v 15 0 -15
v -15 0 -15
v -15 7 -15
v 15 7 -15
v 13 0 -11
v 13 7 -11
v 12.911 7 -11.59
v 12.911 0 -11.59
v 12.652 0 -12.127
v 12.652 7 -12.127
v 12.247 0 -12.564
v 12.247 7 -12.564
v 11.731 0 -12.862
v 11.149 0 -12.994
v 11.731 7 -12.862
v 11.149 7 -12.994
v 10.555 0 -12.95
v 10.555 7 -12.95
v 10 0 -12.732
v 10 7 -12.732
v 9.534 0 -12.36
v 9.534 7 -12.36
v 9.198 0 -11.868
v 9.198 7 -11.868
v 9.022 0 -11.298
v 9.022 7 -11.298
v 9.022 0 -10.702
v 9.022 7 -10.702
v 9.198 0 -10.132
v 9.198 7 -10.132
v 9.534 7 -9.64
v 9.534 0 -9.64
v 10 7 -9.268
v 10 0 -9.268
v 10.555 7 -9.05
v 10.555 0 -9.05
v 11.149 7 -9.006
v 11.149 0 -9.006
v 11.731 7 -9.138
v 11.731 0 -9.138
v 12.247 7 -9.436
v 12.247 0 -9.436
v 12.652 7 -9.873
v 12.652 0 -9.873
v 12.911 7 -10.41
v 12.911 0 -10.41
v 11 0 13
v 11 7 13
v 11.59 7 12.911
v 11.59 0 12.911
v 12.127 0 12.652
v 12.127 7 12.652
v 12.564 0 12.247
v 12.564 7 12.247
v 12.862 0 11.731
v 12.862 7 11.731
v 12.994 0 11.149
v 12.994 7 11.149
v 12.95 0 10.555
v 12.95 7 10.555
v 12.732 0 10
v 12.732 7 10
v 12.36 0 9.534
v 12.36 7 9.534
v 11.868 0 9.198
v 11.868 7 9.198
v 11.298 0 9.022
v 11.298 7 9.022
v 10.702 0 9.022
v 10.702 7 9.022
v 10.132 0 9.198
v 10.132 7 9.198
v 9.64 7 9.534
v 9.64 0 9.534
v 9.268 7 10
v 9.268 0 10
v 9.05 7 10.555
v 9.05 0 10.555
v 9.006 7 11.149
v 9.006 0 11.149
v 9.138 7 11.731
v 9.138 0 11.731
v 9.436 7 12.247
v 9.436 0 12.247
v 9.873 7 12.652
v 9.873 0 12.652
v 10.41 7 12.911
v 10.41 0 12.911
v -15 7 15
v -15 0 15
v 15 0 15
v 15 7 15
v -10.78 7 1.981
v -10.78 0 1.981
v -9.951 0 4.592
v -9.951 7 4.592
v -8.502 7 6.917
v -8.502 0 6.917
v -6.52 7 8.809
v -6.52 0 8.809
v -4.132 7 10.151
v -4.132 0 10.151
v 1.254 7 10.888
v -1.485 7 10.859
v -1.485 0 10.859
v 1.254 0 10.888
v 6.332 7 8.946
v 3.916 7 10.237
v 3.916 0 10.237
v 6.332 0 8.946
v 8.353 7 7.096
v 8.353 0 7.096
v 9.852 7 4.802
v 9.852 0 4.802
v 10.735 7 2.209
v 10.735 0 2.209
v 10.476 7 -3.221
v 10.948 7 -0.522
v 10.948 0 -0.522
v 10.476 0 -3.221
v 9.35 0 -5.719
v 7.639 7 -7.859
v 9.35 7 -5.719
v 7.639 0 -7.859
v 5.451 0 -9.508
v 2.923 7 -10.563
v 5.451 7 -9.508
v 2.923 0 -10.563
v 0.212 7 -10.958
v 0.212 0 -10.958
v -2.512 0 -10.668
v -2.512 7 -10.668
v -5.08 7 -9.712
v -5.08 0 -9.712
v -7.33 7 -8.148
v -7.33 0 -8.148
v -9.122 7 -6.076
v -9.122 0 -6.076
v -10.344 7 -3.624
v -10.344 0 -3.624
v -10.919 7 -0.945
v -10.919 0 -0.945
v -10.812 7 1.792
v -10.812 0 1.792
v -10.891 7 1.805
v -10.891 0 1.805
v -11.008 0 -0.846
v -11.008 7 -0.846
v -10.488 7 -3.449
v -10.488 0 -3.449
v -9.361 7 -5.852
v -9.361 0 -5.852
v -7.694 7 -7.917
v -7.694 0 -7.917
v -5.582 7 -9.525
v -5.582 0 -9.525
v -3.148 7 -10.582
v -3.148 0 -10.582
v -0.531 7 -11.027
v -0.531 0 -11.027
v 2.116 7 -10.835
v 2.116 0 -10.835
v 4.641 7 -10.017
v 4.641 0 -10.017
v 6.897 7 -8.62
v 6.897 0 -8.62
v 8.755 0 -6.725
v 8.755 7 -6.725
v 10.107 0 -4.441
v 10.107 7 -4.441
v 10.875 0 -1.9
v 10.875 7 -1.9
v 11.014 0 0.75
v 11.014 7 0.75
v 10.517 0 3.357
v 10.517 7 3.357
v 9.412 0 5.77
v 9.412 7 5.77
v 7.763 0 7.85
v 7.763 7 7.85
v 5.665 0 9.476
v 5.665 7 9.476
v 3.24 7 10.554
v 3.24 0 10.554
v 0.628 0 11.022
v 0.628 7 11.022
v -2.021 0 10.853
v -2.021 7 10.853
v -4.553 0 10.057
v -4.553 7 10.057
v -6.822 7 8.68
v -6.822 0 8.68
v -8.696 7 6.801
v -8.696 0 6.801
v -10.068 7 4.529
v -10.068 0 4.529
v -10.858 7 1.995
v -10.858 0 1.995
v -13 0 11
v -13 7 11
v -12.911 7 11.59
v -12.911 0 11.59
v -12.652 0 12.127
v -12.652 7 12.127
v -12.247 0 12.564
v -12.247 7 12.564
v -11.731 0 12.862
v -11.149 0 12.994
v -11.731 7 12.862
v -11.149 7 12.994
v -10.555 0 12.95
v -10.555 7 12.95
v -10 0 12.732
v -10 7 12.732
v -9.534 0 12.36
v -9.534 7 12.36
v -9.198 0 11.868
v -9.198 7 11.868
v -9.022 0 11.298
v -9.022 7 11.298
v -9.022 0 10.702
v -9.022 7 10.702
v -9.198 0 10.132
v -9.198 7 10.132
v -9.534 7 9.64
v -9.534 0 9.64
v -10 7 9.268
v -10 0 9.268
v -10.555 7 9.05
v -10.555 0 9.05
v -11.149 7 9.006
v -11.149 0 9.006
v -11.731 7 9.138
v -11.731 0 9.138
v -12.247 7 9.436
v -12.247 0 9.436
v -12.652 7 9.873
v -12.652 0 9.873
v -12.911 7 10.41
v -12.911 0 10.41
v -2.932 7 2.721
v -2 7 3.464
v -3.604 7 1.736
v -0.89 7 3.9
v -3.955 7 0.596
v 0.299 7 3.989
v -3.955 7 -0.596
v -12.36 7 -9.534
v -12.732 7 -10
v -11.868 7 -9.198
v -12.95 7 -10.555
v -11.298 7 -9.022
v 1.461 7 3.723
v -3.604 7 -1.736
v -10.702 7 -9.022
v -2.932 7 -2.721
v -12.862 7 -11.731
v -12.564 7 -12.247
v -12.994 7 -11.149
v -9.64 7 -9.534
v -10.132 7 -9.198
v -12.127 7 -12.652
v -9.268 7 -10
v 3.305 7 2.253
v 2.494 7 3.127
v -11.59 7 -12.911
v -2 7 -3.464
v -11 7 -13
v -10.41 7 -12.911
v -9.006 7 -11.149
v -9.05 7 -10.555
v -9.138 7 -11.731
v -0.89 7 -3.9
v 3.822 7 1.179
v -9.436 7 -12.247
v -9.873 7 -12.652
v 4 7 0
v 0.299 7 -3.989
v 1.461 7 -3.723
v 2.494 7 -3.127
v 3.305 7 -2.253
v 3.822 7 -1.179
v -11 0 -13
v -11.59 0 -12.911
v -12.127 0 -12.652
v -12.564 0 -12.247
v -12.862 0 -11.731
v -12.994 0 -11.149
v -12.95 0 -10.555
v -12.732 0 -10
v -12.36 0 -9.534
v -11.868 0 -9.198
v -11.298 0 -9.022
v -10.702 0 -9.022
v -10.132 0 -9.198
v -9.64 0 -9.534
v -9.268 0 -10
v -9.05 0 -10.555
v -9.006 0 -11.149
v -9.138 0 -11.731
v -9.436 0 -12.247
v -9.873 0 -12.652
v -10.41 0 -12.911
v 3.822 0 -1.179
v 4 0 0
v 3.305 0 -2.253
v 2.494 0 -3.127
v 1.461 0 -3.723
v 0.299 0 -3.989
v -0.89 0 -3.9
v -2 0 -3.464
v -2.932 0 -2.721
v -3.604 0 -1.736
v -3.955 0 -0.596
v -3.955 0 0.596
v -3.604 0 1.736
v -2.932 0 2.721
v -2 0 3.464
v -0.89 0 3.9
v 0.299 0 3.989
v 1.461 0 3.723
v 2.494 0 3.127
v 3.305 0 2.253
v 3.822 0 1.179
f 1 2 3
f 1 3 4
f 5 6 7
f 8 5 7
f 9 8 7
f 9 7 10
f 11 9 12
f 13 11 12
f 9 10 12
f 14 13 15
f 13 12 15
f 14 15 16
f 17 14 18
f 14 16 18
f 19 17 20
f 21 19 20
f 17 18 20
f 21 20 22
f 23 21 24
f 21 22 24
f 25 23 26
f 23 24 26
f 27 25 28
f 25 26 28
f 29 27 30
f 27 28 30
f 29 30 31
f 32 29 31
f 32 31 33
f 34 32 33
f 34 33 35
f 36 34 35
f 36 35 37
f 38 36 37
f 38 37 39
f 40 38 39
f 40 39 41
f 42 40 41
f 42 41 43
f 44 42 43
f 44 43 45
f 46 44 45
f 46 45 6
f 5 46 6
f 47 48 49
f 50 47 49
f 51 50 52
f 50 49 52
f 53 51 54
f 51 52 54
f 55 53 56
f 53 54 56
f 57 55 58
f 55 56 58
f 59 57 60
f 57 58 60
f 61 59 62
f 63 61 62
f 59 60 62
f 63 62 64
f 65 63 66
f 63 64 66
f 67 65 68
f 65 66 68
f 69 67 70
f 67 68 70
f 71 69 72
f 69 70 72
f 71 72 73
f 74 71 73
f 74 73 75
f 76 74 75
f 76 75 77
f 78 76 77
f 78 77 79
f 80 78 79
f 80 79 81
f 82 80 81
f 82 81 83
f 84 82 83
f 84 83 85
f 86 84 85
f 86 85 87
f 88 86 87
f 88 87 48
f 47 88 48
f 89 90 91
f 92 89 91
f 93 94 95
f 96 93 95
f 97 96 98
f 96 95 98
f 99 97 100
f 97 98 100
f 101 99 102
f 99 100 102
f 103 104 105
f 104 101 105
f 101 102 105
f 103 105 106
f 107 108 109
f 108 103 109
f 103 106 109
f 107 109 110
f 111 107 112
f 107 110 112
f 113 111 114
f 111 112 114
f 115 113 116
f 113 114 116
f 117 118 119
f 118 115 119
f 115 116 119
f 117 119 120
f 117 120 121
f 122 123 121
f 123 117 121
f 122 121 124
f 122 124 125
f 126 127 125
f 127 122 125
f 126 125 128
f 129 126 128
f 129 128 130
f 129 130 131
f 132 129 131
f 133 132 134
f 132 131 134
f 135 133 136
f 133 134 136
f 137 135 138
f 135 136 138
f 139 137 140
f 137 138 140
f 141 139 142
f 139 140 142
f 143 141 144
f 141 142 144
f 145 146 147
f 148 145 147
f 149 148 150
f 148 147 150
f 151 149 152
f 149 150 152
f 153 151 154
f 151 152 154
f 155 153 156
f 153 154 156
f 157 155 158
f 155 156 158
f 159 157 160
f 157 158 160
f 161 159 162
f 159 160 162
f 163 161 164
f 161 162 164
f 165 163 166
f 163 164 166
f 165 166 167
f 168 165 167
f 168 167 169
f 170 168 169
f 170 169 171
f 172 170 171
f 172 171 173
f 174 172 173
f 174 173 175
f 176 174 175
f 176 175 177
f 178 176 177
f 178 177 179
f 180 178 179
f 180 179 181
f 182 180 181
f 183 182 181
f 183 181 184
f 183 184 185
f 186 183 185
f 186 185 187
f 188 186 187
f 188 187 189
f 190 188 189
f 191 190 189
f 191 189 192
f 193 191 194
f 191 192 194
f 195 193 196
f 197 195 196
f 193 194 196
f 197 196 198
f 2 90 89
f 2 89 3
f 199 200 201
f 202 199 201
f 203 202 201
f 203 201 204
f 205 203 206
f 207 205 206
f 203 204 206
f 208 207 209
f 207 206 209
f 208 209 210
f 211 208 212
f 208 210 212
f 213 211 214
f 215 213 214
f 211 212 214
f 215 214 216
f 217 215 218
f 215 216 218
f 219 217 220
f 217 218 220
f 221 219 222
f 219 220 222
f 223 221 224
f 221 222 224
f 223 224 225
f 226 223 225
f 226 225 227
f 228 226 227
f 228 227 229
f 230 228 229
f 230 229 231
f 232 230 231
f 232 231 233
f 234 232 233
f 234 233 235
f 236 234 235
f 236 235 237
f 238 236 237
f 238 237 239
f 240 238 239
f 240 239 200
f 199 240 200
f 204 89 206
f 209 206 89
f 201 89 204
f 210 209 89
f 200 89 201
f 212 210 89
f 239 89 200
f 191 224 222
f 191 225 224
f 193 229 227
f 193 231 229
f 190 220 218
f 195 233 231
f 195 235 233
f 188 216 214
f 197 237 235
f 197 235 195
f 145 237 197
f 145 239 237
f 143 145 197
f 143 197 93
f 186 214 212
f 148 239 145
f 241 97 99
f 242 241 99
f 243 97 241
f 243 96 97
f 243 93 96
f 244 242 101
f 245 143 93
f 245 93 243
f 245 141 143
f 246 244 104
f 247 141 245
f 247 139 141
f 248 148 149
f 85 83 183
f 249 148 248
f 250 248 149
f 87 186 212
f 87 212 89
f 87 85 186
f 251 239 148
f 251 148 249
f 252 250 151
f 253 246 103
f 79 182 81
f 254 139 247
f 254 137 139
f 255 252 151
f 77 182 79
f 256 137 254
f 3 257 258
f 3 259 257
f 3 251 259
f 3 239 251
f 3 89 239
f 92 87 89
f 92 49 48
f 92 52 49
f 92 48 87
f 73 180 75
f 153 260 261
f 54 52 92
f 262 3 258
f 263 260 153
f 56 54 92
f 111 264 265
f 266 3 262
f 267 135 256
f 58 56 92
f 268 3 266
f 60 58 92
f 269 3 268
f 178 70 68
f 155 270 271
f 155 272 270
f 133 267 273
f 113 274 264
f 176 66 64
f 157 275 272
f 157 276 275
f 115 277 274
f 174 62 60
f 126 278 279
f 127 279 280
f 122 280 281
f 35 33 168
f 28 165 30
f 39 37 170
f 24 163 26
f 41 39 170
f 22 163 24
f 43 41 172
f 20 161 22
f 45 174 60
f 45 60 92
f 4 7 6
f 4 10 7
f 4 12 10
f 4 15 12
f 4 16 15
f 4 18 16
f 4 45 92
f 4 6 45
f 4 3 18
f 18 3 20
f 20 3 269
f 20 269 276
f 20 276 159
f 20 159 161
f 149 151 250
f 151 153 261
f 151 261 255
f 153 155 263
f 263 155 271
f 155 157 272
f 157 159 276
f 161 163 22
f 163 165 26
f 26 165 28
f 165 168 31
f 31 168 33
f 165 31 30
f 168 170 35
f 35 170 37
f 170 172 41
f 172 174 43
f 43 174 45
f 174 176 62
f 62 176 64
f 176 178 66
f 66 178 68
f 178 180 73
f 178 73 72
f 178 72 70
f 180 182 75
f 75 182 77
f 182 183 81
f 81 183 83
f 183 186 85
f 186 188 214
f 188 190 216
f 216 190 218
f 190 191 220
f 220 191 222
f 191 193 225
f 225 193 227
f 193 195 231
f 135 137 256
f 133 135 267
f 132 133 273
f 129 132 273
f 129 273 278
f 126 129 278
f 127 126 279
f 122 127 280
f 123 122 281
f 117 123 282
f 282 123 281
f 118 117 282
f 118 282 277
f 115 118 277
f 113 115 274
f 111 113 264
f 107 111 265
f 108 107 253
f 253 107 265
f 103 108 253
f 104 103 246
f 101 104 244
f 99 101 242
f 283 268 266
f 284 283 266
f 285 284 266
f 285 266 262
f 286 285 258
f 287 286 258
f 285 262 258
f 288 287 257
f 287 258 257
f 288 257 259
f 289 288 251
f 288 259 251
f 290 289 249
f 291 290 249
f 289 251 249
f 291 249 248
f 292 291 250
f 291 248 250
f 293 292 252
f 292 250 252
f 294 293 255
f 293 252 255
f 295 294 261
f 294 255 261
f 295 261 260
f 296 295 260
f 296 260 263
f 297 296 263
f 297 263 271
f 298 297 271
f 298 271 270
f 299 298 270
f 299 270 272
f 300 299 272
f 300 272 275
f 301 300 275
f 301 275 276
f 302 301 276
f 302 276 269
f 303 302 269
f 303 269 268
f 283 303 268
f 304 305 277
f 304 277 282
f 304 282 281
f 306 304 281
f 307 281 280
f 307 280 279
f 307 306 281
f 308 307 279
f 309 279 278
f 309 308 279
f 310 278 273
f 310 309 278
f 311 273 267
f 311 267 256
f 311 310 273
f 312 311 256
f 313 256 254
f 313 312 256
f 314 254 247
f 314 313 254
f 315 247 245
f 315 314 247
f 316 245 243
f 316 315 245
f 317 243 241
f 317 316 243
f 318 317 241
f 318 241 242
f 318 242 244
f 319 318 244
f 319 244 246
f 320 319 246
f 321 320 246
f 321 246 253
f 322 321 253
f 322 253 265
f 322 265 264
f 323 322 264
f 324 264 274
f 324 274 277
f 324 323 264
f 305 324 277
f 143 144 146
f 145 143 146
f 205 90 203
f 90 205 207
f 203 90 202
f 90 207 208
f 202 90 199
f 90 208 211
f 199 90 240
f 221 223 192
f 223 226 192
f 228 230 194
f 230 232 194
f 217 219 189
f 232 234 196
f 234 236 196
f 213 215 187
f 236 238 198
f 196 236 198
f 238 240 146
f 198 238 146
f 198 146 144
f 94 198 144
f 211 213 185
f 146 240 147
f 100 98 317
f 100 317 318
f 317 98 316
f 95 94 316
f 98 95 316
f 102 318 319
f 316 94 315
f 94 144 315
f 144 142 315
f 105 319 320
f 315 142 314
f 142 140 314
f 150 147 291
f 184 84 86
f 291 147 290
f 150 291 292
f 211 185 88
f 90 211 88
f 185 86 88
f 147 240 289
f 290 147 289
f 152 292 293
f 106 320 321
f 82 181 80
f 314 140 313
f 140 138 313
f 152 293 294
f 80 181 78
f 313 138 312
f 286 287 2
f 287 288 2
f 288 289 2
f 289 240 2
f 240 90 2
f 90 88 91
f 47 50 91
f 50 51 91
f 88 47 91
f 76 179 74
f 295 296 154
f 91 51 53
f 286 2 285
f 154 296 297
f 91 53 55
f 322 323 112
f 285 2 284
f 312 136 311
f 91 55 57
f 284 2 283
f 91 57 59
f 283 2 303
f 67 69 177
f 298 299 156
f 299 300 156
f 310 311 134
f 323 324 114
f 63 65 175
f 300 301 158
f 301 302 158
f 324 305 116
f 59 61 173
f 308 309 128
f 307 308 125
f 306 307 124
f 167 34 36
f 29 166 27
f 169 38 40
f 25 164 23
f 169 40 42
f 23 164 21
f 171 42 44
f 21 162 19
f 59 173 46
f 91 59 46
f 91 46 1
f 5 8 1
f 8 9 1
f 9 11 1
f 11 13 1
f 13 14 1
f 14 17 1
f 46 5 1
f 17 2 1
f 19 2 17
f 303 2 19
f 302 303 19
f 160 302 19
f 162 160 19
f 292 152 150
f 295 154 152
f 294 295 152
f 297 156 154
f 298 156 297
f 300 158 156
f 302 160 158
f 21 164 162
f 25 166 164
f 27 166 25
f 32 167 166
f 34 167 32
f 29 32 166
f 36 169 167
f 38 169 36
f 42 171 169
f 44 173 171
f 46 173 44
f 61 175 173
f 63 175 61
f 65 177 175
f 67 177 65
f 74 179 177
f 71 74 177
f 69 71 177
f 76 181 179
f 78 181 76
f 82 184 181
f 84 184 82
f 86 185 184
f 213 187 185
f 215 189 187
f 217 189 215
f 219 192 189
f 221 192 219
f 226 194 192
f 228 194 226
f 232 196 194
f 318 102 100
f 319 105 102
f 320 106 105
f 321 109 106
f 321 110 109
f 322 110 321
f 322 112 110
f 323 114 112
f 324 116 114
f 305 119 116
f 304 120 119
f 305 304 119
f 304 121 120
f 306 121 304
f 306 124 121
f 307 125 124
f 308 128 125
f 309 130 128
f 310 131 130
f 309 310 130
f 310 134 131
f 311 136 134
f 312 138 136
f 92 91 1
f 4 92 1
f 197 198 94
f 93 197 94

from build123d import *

# Parameters (mm, degrees)
SKETCH1_W                    = 30
SKETCH1_H                    = 30
SKETCH1_R                    = 4
BOSS_EXTRUDE1_DEPTH          = 7
CUT_EXTRUDE_THIN1_DEPTH      = 1
CUT_EXTRUDE_THIN1_DEPTH_BACK = 10
SKETCH3_R                    = 2
CUT_EXTRUDE1_DEPTH           = 10
CIRPATTERN1_COUNT            = 4


with BuildPart() as part:
    # Sketch1 → Boss-Extrude1 (new body)
    with BuildSketch(Plane(origin=(0, 0, 0), x_dir=(1, 0, 0), z_dir=(0, 1, 0))):
        Rectangle(SKETCH1_W, SKETCH1_H)
        Circle(SKETCH1_R, mode=Mode.SUBTRACT)
    extrude(amount=BOSS_EXTRUDE1_DEPTH)

    # Sketch2 → Cut-Extrude-Thin1 (cut, two sides)
    with BuildSketch(Plane.XZ) as cut_extrude_thin1_sk:
        with BuildLine():
            ThreePointArc((-10.891369385, 1.805456431), (10.875199295, -1.900431606), (-10.858201017, 1.995262057))
            Line((-10.858201017, 1.995262057), (-10.779518401, 1.980803636))
            ThreePointArc((-10.779518401, 1.980803636), (10.796393503, -1.886660363), (-10.812446418, 1.792373414))
            Line((-10.812446418, 1.792373414), (-10.891369385, 1.805456431))
        make_face()
    extrude(amount=CUT_EXTRUDE_THIN1_DEPTH, mode=Mode.SUBTRACT)
    extrude(cut_extrude_thin1_sk.sketch, amount=-CUT_EXTRUDE_THIN1_DEPTH_BACK, mode=Mode.SUBTRACT)

    # Sketch3 → Cut-Extrude1 (cut)
    with BuildSketch(Plane(origin=(0, 7, 0), x_dir=(1, 0, 0), z_dir=(0, 1, 0))):
        with Locations((11, 11)):
            Circle(SKETCH3_R)
    cut_extrude1 = extrude(amount=-CUT_EXTRUDE1_DEPTH, mode=Mode.SUBTRACT)

    # CirPattern1: Cut-Extrude1 ×4 about axis
    cirpattern1_axis = Axis((0, 0, 0), (0, 1, 0))
    for i in range(1, CIRPATTERN1_COUNT):
        add(cut_extrude1.rotate(cirpattern1_axis, i * 360 / CIRPATTERN1_COUNT), mode=Mode.SUBTRACT)


solid = part.part
